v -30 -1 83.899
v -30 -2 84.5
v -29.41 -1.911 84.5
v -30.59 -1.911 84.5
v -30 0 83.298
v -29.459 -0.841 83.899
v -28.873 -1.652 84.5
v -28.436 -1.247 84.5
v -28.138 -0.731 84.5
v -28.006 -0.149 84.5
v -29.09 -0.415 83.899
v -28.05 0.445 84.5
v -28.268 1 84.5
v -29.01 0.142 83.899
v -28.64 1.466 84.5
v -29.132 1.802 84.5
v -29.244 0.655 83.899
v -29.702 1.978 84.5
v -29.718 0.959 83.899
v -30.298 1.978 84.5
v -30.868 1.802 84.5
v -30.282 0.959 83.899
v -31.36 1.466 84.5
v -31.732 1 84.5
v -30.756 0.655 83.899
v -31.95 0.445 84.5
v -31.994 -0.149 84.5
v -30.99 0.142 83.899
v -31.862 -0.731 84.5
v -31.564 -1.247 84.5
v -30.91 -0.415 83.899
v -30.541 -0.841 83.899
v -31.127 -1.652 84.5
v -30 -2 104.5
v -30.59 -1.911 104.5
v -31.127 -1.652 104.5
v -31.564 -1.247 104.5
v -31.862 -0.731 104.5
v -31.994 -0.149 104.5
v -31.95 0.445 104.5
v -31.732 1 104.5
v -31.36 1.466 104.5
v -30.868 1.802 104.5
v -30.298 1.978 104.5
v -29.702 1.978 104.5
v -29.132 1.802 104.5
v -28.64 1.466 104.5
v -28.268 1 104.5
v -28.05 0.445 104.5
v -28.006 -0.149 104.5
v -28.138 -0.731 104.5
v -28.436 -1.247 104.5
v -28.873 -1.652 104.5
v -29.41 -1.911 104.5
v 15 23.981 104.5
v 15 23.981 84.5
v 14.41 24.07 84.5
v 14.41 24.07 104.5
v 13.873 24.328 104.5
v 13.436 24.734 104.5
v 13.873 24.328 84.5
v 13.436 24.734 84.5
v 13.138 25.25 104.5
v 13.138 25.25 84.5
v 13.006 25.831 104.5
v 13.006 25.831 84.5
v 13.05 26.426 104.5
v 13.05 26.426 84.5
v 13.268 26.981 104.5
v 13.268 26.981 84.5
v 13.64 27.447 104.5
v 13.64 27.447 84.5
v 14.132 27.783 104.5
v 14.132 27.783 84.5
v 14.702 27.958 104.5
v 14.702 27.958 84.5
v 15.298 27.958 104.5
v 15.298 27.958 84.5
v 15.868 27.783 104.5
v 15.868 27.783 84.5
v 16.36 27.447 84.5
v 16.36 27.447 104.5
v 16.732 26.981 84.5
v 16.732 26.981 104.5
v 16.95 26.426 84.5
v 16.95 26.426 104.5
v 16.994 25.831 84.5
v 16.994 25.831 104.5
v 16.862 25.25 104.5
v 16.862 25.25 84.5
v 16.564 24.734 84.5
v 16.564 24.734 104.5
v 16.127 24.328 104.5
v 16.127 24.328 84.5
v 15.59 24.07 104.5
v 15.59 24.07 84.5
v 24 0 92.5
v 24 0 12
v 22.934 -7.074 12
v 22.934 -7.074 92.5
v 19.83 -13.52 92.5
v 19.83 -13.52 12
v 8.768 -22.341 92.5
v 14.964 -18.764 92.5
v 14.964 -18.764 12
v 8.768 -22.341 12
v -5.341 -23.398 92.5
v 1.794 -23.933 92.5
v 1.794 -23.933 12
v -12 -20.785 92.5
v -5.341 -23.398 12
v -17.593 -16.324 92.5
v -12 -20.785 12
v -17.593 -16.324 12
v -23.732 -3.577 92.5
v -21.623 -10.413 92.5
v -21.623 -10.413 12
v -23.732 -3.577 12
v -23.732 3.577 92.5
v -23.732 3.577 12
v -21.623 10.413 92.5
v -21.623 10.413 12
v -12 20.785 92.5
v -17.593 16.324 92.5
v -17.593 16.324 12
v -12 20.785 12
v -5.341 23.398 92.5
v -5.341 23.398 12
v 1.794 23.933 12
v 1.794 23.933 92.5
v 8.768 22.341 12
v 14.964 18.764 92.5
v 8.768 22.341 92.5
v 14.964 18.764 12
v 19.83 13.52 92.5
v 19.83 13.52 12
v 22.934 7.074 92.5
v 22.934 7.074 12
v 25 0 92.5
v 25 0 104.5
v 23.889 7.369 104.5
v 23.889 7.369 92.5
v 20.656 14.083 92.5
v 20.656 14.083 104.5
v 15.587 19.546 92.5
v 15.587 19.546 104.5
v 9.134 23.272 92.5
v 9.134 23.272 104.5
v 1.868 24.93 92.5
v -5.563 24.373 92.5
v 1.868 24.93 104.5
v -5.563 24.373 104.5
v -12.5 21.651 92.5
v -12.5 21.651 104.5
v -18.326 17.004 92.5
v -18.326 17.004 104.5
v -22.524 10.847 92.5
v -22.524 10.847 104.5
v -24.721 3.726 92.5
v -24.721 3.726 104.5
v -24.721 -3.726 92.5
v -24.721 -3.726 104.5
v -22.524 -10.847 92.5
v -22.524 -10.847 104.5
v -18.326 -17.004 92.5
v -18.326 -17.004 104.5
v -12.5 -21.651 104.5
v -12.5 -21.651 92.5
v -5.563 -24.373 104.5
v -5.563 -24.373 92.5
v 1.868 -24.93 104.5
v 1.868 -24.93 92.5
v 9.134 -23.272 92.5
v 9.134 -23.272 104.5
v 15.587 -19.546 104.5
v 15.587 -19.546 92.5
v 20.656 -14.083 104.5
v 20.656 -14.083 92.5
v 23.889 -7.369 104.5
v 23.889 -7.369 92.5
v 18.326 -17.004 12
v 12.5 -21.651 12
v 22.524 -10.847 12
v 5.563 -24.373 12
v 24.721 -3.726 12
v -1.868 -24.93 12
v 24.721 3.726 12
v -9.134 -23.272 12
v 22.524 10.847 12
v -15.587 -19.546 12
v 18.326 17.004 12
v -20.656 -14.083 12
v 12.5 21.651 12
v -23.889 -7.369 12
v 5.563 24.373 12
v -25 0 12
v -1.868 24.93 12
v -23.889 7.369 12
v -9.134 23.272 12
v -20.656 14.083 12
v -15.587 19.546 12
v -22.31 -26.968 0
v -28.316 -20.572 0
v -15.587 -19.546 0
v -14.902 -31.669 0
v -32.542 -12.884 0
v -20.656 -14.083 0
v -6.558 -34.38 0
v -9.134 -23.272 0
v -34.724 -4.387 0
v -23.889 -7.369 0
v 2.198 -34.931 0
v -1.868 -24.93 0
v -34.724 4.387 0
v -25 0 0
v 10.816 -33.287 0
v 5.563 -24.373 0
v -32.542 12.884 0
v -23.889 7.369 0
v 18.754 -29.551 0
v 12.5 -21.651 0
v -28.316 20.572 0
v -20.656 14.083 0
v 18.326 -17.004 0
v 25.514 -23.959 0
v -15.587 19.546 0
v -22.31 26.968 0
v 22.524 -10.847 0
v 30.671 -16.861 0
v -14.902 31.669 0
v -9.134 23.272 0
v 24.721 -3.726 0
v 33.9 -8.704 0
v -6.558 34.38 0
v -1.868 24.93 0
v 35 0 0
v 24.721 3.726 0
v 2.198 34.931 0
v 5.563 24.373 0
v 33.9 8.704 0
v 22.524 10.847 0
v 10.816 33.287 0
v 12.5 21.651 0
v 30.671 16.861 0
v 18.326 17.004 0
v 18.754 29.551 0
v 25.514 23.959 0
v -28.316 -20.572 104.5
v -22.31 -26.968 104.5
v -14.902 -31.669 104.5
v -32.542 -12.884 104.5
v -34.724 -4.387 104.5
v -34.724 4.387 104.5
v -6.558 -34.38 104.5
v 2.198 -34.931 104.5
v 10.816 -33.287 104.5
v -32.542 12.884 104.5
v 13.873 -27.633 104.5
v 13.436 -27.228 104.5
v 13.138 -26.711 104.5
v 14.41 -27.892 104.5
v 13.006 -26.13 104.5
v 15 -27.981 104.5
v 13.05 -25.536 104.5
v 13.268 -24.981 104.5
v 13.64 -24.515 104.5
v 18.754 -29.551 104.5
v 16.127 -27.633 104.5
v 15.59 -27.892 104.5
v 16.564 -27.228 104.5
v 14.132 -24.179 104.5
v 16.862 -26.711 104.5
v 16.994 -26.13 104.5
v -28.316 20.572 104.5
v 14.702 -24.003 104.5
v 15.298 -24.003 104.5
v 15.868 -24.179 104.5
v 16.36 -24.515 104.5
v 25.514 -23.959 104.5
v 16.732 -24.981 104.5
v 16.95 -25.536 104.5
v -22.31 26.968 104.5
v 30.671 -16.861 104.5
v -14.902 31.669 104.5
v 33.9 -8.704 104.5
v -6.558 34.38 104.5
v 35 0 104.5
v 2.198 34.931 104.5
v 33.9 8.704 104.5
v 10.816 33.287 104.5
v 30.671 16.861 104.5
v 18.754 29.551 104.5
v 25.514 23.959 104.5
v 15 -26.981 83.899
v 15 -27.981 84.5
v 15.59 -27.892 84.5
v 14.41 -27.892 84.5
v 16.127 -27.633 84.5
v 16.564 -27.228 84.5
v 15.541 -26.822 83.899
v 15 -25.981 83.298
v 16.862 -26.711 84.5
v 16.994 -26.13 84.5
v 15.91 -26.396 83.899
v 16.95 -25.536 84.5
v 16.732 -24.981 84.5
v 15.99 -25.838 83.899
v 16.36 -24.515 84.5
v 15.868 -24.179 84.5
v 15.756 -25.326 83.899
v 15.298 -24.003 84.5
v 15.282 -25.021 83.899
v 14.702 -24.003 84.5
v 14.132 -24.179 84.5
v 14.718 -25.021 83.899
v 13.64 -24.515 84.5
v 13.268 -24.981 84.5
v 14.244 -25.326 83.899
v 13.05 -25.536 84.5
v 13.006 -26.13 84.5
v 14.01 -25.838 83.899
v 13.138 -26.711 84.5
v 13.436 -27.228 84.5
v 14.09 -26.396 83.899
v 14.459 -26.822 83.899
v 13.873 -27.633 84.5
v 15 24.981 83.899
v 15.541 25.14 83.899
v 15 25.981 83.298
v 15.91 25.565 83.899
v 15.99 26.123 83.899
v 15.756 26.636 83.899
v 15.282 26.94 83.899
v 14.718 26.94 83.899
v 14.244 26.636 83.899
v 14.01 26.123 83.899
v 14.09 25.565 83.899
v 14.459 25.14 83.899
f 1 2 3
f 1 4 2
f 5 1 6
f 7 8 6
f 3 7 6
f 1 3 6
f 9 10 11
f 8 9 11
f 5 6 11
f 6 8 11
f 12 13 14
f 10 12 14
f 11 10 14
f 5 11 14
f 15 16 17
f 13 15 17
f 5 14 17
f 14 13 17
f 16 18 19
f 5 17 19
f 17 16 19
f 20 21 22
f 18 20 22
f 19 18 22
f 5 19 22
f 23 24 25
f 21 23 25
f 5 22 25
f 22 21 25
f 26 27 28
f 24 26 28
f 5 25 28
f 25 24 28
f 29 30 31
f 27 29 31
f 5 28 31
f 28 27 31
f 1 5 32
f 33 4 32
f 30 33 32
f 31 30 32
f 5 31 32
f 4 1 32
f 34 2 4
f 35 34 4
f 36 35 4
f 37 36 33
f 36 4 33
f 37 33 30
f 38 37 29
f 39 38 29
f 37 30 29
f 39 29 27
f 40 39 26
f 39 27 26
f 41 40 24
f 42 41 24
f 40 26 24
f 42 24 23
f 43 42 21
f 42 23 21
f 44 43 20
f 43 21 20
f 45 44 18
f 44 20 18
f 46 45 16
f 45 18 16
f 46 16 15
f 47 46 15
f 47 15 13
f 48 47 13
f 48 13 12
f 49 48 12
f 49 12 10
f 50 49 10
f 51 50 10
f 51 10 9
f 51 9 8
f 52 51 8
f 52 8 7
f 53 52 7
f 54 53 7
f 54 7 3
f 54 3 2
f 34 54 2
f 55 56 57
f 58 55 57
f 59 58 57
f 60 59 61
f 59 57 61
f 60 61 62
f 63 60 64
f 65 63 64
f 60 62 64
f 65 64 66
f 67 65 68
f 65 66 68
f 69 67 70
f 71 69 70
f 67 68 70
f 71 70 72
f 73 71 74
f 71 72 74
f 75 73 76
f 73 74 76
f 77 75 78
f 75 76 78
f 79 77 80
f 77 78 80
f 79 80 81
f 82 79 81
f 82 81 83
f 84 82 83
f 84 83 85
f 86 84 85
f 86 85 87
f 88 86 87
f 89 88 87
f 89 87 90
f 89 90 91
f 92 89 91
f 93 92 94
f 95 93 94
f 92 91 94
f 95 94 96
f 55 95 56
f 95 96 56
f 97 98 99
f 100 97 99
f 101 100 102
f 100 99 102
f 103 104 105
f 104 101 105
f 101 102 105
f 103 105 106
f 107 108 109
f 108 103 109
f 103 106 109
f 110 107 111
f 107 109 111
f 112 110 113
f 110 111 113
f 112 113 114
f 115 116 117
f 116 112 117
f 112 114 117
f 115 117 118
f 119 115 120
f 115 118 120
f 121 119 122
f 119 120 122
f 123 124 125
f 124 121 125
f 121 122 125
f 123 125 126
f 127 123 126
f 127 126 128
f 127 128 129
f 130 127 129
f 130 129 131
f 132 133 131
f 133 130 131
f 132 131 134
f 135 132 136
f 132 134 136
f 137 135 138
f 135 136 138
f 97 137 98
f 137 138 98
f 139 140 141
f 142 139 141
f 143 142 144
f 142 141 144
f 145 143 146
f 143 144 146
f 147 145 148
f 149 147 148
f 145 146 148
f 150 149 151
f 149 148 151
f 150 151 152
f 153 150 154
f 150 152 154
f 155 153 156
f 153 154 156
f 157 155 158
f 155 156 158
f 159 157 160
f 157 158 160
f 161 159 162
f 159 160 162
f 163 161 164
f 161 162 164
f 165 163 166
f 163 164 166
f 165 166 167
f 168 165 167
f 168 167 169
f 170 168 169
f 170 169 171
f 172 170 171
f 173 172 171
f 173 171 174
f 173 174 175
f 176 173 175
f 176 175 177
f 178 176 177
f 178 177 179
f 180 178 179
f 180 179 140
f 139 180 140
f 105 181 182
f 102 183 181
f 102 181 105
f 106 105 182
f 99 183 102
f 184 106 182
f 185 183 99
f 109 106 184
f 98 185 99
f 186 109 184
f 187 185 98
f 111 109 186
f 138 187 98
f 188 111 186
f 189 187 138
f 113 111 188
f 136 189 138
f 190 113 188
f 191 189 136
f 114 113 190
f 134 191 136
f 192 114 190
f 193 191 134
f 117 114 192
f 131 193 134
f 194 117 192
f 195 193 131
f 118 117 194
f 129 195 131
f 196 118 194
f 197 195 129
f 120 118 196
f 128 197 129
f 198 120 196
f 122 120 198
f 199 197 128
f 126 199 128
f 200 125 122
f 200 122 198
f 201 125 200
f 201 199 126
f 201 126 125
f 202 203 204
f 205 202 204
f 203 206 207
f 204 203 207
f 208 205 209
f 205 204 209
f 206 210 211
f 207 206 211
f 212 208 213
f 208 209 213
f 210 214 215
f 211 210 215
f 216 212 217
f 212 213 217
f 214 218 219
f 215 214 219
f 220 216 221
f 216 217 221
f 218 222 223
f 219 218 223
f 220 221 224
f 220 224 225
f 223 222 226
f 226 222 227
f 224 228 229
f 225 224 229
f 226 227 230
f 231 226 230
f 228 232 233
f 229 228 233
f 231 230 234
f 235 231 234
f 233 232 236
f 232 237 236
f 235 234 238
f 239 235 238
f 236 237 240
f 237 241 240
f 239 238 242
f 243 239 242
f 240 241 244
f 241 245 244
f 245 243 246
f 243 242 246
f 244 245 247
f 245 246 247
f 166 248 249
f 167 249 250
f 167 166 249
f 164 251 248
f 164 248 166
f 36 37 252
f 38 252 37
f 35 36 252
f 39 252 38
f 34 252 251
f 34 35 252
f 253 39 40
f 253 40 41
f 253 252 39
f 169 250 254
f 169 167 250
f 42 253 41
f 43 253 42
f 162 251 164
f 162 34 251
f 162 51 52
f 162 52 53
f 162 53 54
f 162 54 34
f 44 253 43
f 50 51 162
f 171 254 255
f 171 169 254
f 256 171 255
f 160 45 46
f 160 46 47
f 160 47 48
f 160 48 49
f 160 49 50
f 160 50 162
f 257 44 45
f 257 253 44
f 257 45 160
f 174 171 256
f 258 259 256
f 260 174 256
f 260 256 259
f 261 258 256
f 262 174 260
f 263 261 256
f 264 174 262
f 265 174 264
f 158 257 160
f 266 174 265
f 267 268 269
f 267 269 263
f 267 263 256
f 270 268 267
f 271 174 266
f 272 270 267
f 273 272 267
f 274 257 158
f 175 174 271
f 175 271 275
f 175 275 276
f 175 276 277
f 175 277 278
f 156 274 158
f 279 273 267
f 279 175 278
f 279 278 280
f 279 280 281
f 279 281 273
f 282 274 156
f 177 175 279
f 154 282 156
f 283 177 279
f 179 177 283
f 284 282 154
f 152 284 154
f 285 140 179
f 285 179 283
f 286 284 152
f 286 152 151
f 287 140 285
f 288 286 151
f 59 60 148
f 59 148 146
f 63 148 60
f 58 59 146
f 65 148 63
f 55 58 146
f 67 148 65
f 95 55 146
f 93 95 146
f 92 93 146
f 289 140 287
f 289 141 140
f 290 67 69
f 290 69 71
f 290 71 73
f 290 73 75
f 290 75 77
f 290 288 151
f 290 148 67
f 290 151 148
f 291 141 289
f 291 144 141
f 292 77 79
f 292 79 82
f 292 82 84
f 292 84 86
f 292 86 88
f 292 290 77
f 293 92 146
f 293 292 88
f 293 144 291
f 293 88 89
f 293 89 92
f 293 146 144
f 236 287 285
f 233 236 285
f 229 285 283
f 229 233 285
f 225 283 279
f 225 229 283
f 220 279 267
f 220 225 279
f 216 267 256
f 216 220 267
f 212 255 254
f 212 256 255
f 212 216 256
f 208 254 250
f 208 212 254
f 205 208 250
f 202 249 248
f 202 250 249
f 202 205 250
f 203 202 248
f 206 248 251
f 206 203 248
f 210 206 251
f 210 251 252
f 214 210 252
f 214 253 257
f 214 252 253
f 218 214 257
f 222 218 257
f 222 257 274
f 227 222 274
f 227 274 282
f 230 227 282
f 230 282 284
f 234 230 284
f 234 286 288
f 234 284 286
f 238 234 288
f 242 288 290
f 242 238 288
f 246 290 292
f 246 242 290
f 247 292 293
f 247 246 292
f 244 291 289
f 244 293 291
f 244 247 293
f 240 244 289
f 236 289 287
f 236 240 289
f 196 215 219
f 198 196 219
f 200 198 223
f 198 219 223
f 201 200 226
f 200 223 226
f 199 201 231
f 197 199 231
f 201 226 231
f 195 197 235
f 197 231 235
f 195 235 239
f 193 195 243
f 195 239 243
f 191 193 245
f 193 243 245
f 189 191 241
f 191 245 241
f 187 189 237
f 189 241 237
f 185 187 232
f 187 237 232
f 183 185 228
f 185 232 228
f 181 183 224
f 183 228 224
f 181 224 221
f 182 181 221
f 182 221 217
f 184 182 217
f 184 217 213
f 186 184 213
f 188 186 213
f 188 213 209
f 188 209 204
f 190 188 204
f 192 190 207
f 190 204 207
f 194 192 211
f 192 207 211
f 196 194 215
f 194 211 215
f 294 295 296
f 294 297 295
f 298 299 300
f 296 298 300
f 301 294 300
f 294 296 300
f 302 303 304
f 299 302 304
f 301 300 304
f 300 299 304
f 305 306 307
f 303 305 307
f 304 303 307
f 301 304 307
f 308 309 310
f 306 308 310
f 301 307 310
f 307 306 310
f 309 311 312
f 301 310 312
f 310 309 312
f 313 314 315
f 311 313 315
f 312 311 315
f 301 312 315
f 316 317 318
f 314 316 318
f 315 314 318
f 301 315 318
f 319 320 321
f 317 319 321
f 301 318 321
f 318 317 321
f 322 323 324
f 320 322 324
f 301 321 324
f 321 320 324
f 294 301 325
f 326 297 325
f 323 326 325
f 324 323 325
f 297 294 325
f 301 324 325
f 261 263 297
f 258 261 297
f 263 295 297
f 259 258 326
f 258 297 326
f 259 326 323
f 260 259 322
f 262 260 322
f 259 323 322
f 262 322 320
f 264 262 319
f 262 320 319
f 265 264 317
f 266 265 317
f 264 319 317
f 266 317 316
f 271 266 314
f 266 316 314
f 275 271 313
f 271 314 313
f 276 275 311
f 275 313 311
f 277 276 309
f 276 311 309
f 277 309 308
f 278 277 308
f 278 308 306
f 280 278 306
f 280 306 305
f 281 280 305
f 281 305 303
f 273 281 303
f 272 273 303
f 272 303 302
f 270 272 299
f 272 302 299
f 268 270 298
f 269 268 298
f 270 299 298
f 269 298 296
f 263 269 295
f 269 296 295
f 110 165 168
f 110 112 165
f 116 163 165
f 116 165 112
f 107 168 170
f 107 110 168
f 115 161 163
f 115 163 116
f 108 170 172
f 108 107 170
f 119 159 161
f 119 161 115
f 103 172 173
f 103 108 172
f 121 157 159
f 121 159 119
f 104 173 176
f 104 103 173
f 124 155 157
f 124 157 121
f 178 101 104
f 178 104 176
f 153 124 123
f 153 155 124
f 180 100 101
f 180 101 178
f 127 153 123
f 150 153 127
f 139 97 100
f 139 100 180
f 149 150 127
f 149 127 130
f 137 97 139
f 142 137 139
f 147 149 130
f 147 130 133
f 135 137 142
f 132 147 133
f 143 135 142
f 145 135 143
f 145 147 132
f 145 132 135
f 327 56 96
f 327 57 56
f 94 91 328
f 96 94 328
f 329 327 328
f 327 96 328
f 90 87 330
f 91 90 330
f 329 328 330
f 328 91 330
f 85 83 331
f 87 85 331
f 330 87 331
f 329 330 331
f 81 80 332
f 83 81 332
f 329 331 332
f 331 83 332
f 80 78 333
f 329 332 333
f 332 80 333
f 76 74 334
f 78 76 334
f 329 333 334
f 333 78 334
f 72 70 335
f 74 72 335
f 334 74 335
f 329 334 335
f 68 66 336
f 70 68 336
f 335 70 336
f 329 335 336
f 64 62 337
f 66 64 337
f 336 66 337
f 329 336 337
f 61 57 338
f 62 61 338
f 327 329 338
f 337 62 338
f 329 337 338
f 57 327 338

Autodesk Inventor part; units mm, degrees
ref_plane "YZ Plane" through (0, 0, 0) normal (1, 0, 0) x (0, 1, 0)
ref_plane "Startebene" through (0, 0, 0) normal (0, 0, 1) x (1, 0, 0)
ref_plane "Endebene" through (0, 0, 104.5) normal (0, 0, 1) x (1, 0, 0)
sketch "Skizze" plane through (0, 0, 0) normal (0, 0, 1) x (1, 0, 0)
  circle A0 centre (0, 0) radius 24
  circle A1 centre (0, 0) radius 35
  dimension "d0" = 70
  dimension "d1" = 11
extrude "Körper" add sketch "Skizze" along normal up to surface (104.5 mm away) from surface at 0
sketch "Sketch3" plane through (0, 0, 0) normal (0, 0, 1) x (1, 0, 0)
  line L0 (0, 0) -> (10, 0)
ref_plane "Work Plane3" through (0, 0, 0) normal (0, -1, 0) x (1, 0, 0)
sketch "Sketch4" plane through (0, 0, 0) normal (0, -1, 0) x (1, 0, 0)
  line L0 (-2, 0) -> (12, 0)
  line L1 (-2, 104.5) -> (12, 104.5)
  dimension "d7" = 104.5
sketch "Skizze5" plane through (0, 0, 104.5) normal (0, 0, 1) x (1, 0, 0)
  circle A0 centre (0, 0) radius 24 projected
  line L0 (-49, 0) -> (49, 0) projected
  point P0 (-30, 0)
  point P1 (15, 25.9808)
  point P2 (15, -25.9808)
  dimension "d8" = 30
  dimension "d11" = 360
hole "Bohrung1" at (-30, 0, 104.5) at (15, 25.9808, 104.5) at (15, -25.9808, 104.5) direction (0, 0, -1) diameter 4 depth 20 tip angle 118
thread "Gewinde1" size "M4x0.7" class "6H" standard "ISO Metric profile" length 18
thread "Gewinde2" size "M4x0.7" class "6H" standard "ISO Metric profile" length 18
thread "Gewinde3" size "M4x0.7" class "6H" standard "ISO Metric profile" length 18
sketch "Skizze6" plane through (0, 0, 104.5) normal (0, 0, 1) x (1, 0, 0)
  circle A0 centre (0, 0) radius 24 projected
  circle A1 centre (0, 0) radius 35 projected
  circle A2 centre (0, 0) radius 25
  dimension "d29" = 1
extrude "Extrusion2" cut sketch "Skizze6" against normal blind 12 contours A2
ref_plane "Arbeitsebene4" through (0, 0, 0) normal (0, 0, -1) x (-1, 0, 0)
sketch "Skizze7" plane through (0, 0, 0) normal (0, 0, -1) x (-1, 0, 0)
  circle A0 centre (0, 0) radius 24 projected
  circle A1 centre (0, 0) radius 32 projected
  circle A2 centre (0, 0) radius 25
  dimension "d32" = 1
extrude "Extrusion3" cut sketch "Skizze7" against normal blind 12 contours A2
equation "\"d0\" = G_H"
equation "\"d1\" = G_T"
equation "\"d2\" = G_L"
equation "\"G_H\" = 70"
equation "\"G_T\" = 11"
equation "\"G_L\" = d7"
equation "\"G_OFFSET_START\" = 0"
equation "\"G_OFFSET_END\" = 0"
equation "\"d5\" = G_OFFSET_END + B_L"
equation "\"B_L\" = 104.5"
properties part number "DIN EN 10220-2 - 57 x 5 - 100" material "Stahl, weich"
